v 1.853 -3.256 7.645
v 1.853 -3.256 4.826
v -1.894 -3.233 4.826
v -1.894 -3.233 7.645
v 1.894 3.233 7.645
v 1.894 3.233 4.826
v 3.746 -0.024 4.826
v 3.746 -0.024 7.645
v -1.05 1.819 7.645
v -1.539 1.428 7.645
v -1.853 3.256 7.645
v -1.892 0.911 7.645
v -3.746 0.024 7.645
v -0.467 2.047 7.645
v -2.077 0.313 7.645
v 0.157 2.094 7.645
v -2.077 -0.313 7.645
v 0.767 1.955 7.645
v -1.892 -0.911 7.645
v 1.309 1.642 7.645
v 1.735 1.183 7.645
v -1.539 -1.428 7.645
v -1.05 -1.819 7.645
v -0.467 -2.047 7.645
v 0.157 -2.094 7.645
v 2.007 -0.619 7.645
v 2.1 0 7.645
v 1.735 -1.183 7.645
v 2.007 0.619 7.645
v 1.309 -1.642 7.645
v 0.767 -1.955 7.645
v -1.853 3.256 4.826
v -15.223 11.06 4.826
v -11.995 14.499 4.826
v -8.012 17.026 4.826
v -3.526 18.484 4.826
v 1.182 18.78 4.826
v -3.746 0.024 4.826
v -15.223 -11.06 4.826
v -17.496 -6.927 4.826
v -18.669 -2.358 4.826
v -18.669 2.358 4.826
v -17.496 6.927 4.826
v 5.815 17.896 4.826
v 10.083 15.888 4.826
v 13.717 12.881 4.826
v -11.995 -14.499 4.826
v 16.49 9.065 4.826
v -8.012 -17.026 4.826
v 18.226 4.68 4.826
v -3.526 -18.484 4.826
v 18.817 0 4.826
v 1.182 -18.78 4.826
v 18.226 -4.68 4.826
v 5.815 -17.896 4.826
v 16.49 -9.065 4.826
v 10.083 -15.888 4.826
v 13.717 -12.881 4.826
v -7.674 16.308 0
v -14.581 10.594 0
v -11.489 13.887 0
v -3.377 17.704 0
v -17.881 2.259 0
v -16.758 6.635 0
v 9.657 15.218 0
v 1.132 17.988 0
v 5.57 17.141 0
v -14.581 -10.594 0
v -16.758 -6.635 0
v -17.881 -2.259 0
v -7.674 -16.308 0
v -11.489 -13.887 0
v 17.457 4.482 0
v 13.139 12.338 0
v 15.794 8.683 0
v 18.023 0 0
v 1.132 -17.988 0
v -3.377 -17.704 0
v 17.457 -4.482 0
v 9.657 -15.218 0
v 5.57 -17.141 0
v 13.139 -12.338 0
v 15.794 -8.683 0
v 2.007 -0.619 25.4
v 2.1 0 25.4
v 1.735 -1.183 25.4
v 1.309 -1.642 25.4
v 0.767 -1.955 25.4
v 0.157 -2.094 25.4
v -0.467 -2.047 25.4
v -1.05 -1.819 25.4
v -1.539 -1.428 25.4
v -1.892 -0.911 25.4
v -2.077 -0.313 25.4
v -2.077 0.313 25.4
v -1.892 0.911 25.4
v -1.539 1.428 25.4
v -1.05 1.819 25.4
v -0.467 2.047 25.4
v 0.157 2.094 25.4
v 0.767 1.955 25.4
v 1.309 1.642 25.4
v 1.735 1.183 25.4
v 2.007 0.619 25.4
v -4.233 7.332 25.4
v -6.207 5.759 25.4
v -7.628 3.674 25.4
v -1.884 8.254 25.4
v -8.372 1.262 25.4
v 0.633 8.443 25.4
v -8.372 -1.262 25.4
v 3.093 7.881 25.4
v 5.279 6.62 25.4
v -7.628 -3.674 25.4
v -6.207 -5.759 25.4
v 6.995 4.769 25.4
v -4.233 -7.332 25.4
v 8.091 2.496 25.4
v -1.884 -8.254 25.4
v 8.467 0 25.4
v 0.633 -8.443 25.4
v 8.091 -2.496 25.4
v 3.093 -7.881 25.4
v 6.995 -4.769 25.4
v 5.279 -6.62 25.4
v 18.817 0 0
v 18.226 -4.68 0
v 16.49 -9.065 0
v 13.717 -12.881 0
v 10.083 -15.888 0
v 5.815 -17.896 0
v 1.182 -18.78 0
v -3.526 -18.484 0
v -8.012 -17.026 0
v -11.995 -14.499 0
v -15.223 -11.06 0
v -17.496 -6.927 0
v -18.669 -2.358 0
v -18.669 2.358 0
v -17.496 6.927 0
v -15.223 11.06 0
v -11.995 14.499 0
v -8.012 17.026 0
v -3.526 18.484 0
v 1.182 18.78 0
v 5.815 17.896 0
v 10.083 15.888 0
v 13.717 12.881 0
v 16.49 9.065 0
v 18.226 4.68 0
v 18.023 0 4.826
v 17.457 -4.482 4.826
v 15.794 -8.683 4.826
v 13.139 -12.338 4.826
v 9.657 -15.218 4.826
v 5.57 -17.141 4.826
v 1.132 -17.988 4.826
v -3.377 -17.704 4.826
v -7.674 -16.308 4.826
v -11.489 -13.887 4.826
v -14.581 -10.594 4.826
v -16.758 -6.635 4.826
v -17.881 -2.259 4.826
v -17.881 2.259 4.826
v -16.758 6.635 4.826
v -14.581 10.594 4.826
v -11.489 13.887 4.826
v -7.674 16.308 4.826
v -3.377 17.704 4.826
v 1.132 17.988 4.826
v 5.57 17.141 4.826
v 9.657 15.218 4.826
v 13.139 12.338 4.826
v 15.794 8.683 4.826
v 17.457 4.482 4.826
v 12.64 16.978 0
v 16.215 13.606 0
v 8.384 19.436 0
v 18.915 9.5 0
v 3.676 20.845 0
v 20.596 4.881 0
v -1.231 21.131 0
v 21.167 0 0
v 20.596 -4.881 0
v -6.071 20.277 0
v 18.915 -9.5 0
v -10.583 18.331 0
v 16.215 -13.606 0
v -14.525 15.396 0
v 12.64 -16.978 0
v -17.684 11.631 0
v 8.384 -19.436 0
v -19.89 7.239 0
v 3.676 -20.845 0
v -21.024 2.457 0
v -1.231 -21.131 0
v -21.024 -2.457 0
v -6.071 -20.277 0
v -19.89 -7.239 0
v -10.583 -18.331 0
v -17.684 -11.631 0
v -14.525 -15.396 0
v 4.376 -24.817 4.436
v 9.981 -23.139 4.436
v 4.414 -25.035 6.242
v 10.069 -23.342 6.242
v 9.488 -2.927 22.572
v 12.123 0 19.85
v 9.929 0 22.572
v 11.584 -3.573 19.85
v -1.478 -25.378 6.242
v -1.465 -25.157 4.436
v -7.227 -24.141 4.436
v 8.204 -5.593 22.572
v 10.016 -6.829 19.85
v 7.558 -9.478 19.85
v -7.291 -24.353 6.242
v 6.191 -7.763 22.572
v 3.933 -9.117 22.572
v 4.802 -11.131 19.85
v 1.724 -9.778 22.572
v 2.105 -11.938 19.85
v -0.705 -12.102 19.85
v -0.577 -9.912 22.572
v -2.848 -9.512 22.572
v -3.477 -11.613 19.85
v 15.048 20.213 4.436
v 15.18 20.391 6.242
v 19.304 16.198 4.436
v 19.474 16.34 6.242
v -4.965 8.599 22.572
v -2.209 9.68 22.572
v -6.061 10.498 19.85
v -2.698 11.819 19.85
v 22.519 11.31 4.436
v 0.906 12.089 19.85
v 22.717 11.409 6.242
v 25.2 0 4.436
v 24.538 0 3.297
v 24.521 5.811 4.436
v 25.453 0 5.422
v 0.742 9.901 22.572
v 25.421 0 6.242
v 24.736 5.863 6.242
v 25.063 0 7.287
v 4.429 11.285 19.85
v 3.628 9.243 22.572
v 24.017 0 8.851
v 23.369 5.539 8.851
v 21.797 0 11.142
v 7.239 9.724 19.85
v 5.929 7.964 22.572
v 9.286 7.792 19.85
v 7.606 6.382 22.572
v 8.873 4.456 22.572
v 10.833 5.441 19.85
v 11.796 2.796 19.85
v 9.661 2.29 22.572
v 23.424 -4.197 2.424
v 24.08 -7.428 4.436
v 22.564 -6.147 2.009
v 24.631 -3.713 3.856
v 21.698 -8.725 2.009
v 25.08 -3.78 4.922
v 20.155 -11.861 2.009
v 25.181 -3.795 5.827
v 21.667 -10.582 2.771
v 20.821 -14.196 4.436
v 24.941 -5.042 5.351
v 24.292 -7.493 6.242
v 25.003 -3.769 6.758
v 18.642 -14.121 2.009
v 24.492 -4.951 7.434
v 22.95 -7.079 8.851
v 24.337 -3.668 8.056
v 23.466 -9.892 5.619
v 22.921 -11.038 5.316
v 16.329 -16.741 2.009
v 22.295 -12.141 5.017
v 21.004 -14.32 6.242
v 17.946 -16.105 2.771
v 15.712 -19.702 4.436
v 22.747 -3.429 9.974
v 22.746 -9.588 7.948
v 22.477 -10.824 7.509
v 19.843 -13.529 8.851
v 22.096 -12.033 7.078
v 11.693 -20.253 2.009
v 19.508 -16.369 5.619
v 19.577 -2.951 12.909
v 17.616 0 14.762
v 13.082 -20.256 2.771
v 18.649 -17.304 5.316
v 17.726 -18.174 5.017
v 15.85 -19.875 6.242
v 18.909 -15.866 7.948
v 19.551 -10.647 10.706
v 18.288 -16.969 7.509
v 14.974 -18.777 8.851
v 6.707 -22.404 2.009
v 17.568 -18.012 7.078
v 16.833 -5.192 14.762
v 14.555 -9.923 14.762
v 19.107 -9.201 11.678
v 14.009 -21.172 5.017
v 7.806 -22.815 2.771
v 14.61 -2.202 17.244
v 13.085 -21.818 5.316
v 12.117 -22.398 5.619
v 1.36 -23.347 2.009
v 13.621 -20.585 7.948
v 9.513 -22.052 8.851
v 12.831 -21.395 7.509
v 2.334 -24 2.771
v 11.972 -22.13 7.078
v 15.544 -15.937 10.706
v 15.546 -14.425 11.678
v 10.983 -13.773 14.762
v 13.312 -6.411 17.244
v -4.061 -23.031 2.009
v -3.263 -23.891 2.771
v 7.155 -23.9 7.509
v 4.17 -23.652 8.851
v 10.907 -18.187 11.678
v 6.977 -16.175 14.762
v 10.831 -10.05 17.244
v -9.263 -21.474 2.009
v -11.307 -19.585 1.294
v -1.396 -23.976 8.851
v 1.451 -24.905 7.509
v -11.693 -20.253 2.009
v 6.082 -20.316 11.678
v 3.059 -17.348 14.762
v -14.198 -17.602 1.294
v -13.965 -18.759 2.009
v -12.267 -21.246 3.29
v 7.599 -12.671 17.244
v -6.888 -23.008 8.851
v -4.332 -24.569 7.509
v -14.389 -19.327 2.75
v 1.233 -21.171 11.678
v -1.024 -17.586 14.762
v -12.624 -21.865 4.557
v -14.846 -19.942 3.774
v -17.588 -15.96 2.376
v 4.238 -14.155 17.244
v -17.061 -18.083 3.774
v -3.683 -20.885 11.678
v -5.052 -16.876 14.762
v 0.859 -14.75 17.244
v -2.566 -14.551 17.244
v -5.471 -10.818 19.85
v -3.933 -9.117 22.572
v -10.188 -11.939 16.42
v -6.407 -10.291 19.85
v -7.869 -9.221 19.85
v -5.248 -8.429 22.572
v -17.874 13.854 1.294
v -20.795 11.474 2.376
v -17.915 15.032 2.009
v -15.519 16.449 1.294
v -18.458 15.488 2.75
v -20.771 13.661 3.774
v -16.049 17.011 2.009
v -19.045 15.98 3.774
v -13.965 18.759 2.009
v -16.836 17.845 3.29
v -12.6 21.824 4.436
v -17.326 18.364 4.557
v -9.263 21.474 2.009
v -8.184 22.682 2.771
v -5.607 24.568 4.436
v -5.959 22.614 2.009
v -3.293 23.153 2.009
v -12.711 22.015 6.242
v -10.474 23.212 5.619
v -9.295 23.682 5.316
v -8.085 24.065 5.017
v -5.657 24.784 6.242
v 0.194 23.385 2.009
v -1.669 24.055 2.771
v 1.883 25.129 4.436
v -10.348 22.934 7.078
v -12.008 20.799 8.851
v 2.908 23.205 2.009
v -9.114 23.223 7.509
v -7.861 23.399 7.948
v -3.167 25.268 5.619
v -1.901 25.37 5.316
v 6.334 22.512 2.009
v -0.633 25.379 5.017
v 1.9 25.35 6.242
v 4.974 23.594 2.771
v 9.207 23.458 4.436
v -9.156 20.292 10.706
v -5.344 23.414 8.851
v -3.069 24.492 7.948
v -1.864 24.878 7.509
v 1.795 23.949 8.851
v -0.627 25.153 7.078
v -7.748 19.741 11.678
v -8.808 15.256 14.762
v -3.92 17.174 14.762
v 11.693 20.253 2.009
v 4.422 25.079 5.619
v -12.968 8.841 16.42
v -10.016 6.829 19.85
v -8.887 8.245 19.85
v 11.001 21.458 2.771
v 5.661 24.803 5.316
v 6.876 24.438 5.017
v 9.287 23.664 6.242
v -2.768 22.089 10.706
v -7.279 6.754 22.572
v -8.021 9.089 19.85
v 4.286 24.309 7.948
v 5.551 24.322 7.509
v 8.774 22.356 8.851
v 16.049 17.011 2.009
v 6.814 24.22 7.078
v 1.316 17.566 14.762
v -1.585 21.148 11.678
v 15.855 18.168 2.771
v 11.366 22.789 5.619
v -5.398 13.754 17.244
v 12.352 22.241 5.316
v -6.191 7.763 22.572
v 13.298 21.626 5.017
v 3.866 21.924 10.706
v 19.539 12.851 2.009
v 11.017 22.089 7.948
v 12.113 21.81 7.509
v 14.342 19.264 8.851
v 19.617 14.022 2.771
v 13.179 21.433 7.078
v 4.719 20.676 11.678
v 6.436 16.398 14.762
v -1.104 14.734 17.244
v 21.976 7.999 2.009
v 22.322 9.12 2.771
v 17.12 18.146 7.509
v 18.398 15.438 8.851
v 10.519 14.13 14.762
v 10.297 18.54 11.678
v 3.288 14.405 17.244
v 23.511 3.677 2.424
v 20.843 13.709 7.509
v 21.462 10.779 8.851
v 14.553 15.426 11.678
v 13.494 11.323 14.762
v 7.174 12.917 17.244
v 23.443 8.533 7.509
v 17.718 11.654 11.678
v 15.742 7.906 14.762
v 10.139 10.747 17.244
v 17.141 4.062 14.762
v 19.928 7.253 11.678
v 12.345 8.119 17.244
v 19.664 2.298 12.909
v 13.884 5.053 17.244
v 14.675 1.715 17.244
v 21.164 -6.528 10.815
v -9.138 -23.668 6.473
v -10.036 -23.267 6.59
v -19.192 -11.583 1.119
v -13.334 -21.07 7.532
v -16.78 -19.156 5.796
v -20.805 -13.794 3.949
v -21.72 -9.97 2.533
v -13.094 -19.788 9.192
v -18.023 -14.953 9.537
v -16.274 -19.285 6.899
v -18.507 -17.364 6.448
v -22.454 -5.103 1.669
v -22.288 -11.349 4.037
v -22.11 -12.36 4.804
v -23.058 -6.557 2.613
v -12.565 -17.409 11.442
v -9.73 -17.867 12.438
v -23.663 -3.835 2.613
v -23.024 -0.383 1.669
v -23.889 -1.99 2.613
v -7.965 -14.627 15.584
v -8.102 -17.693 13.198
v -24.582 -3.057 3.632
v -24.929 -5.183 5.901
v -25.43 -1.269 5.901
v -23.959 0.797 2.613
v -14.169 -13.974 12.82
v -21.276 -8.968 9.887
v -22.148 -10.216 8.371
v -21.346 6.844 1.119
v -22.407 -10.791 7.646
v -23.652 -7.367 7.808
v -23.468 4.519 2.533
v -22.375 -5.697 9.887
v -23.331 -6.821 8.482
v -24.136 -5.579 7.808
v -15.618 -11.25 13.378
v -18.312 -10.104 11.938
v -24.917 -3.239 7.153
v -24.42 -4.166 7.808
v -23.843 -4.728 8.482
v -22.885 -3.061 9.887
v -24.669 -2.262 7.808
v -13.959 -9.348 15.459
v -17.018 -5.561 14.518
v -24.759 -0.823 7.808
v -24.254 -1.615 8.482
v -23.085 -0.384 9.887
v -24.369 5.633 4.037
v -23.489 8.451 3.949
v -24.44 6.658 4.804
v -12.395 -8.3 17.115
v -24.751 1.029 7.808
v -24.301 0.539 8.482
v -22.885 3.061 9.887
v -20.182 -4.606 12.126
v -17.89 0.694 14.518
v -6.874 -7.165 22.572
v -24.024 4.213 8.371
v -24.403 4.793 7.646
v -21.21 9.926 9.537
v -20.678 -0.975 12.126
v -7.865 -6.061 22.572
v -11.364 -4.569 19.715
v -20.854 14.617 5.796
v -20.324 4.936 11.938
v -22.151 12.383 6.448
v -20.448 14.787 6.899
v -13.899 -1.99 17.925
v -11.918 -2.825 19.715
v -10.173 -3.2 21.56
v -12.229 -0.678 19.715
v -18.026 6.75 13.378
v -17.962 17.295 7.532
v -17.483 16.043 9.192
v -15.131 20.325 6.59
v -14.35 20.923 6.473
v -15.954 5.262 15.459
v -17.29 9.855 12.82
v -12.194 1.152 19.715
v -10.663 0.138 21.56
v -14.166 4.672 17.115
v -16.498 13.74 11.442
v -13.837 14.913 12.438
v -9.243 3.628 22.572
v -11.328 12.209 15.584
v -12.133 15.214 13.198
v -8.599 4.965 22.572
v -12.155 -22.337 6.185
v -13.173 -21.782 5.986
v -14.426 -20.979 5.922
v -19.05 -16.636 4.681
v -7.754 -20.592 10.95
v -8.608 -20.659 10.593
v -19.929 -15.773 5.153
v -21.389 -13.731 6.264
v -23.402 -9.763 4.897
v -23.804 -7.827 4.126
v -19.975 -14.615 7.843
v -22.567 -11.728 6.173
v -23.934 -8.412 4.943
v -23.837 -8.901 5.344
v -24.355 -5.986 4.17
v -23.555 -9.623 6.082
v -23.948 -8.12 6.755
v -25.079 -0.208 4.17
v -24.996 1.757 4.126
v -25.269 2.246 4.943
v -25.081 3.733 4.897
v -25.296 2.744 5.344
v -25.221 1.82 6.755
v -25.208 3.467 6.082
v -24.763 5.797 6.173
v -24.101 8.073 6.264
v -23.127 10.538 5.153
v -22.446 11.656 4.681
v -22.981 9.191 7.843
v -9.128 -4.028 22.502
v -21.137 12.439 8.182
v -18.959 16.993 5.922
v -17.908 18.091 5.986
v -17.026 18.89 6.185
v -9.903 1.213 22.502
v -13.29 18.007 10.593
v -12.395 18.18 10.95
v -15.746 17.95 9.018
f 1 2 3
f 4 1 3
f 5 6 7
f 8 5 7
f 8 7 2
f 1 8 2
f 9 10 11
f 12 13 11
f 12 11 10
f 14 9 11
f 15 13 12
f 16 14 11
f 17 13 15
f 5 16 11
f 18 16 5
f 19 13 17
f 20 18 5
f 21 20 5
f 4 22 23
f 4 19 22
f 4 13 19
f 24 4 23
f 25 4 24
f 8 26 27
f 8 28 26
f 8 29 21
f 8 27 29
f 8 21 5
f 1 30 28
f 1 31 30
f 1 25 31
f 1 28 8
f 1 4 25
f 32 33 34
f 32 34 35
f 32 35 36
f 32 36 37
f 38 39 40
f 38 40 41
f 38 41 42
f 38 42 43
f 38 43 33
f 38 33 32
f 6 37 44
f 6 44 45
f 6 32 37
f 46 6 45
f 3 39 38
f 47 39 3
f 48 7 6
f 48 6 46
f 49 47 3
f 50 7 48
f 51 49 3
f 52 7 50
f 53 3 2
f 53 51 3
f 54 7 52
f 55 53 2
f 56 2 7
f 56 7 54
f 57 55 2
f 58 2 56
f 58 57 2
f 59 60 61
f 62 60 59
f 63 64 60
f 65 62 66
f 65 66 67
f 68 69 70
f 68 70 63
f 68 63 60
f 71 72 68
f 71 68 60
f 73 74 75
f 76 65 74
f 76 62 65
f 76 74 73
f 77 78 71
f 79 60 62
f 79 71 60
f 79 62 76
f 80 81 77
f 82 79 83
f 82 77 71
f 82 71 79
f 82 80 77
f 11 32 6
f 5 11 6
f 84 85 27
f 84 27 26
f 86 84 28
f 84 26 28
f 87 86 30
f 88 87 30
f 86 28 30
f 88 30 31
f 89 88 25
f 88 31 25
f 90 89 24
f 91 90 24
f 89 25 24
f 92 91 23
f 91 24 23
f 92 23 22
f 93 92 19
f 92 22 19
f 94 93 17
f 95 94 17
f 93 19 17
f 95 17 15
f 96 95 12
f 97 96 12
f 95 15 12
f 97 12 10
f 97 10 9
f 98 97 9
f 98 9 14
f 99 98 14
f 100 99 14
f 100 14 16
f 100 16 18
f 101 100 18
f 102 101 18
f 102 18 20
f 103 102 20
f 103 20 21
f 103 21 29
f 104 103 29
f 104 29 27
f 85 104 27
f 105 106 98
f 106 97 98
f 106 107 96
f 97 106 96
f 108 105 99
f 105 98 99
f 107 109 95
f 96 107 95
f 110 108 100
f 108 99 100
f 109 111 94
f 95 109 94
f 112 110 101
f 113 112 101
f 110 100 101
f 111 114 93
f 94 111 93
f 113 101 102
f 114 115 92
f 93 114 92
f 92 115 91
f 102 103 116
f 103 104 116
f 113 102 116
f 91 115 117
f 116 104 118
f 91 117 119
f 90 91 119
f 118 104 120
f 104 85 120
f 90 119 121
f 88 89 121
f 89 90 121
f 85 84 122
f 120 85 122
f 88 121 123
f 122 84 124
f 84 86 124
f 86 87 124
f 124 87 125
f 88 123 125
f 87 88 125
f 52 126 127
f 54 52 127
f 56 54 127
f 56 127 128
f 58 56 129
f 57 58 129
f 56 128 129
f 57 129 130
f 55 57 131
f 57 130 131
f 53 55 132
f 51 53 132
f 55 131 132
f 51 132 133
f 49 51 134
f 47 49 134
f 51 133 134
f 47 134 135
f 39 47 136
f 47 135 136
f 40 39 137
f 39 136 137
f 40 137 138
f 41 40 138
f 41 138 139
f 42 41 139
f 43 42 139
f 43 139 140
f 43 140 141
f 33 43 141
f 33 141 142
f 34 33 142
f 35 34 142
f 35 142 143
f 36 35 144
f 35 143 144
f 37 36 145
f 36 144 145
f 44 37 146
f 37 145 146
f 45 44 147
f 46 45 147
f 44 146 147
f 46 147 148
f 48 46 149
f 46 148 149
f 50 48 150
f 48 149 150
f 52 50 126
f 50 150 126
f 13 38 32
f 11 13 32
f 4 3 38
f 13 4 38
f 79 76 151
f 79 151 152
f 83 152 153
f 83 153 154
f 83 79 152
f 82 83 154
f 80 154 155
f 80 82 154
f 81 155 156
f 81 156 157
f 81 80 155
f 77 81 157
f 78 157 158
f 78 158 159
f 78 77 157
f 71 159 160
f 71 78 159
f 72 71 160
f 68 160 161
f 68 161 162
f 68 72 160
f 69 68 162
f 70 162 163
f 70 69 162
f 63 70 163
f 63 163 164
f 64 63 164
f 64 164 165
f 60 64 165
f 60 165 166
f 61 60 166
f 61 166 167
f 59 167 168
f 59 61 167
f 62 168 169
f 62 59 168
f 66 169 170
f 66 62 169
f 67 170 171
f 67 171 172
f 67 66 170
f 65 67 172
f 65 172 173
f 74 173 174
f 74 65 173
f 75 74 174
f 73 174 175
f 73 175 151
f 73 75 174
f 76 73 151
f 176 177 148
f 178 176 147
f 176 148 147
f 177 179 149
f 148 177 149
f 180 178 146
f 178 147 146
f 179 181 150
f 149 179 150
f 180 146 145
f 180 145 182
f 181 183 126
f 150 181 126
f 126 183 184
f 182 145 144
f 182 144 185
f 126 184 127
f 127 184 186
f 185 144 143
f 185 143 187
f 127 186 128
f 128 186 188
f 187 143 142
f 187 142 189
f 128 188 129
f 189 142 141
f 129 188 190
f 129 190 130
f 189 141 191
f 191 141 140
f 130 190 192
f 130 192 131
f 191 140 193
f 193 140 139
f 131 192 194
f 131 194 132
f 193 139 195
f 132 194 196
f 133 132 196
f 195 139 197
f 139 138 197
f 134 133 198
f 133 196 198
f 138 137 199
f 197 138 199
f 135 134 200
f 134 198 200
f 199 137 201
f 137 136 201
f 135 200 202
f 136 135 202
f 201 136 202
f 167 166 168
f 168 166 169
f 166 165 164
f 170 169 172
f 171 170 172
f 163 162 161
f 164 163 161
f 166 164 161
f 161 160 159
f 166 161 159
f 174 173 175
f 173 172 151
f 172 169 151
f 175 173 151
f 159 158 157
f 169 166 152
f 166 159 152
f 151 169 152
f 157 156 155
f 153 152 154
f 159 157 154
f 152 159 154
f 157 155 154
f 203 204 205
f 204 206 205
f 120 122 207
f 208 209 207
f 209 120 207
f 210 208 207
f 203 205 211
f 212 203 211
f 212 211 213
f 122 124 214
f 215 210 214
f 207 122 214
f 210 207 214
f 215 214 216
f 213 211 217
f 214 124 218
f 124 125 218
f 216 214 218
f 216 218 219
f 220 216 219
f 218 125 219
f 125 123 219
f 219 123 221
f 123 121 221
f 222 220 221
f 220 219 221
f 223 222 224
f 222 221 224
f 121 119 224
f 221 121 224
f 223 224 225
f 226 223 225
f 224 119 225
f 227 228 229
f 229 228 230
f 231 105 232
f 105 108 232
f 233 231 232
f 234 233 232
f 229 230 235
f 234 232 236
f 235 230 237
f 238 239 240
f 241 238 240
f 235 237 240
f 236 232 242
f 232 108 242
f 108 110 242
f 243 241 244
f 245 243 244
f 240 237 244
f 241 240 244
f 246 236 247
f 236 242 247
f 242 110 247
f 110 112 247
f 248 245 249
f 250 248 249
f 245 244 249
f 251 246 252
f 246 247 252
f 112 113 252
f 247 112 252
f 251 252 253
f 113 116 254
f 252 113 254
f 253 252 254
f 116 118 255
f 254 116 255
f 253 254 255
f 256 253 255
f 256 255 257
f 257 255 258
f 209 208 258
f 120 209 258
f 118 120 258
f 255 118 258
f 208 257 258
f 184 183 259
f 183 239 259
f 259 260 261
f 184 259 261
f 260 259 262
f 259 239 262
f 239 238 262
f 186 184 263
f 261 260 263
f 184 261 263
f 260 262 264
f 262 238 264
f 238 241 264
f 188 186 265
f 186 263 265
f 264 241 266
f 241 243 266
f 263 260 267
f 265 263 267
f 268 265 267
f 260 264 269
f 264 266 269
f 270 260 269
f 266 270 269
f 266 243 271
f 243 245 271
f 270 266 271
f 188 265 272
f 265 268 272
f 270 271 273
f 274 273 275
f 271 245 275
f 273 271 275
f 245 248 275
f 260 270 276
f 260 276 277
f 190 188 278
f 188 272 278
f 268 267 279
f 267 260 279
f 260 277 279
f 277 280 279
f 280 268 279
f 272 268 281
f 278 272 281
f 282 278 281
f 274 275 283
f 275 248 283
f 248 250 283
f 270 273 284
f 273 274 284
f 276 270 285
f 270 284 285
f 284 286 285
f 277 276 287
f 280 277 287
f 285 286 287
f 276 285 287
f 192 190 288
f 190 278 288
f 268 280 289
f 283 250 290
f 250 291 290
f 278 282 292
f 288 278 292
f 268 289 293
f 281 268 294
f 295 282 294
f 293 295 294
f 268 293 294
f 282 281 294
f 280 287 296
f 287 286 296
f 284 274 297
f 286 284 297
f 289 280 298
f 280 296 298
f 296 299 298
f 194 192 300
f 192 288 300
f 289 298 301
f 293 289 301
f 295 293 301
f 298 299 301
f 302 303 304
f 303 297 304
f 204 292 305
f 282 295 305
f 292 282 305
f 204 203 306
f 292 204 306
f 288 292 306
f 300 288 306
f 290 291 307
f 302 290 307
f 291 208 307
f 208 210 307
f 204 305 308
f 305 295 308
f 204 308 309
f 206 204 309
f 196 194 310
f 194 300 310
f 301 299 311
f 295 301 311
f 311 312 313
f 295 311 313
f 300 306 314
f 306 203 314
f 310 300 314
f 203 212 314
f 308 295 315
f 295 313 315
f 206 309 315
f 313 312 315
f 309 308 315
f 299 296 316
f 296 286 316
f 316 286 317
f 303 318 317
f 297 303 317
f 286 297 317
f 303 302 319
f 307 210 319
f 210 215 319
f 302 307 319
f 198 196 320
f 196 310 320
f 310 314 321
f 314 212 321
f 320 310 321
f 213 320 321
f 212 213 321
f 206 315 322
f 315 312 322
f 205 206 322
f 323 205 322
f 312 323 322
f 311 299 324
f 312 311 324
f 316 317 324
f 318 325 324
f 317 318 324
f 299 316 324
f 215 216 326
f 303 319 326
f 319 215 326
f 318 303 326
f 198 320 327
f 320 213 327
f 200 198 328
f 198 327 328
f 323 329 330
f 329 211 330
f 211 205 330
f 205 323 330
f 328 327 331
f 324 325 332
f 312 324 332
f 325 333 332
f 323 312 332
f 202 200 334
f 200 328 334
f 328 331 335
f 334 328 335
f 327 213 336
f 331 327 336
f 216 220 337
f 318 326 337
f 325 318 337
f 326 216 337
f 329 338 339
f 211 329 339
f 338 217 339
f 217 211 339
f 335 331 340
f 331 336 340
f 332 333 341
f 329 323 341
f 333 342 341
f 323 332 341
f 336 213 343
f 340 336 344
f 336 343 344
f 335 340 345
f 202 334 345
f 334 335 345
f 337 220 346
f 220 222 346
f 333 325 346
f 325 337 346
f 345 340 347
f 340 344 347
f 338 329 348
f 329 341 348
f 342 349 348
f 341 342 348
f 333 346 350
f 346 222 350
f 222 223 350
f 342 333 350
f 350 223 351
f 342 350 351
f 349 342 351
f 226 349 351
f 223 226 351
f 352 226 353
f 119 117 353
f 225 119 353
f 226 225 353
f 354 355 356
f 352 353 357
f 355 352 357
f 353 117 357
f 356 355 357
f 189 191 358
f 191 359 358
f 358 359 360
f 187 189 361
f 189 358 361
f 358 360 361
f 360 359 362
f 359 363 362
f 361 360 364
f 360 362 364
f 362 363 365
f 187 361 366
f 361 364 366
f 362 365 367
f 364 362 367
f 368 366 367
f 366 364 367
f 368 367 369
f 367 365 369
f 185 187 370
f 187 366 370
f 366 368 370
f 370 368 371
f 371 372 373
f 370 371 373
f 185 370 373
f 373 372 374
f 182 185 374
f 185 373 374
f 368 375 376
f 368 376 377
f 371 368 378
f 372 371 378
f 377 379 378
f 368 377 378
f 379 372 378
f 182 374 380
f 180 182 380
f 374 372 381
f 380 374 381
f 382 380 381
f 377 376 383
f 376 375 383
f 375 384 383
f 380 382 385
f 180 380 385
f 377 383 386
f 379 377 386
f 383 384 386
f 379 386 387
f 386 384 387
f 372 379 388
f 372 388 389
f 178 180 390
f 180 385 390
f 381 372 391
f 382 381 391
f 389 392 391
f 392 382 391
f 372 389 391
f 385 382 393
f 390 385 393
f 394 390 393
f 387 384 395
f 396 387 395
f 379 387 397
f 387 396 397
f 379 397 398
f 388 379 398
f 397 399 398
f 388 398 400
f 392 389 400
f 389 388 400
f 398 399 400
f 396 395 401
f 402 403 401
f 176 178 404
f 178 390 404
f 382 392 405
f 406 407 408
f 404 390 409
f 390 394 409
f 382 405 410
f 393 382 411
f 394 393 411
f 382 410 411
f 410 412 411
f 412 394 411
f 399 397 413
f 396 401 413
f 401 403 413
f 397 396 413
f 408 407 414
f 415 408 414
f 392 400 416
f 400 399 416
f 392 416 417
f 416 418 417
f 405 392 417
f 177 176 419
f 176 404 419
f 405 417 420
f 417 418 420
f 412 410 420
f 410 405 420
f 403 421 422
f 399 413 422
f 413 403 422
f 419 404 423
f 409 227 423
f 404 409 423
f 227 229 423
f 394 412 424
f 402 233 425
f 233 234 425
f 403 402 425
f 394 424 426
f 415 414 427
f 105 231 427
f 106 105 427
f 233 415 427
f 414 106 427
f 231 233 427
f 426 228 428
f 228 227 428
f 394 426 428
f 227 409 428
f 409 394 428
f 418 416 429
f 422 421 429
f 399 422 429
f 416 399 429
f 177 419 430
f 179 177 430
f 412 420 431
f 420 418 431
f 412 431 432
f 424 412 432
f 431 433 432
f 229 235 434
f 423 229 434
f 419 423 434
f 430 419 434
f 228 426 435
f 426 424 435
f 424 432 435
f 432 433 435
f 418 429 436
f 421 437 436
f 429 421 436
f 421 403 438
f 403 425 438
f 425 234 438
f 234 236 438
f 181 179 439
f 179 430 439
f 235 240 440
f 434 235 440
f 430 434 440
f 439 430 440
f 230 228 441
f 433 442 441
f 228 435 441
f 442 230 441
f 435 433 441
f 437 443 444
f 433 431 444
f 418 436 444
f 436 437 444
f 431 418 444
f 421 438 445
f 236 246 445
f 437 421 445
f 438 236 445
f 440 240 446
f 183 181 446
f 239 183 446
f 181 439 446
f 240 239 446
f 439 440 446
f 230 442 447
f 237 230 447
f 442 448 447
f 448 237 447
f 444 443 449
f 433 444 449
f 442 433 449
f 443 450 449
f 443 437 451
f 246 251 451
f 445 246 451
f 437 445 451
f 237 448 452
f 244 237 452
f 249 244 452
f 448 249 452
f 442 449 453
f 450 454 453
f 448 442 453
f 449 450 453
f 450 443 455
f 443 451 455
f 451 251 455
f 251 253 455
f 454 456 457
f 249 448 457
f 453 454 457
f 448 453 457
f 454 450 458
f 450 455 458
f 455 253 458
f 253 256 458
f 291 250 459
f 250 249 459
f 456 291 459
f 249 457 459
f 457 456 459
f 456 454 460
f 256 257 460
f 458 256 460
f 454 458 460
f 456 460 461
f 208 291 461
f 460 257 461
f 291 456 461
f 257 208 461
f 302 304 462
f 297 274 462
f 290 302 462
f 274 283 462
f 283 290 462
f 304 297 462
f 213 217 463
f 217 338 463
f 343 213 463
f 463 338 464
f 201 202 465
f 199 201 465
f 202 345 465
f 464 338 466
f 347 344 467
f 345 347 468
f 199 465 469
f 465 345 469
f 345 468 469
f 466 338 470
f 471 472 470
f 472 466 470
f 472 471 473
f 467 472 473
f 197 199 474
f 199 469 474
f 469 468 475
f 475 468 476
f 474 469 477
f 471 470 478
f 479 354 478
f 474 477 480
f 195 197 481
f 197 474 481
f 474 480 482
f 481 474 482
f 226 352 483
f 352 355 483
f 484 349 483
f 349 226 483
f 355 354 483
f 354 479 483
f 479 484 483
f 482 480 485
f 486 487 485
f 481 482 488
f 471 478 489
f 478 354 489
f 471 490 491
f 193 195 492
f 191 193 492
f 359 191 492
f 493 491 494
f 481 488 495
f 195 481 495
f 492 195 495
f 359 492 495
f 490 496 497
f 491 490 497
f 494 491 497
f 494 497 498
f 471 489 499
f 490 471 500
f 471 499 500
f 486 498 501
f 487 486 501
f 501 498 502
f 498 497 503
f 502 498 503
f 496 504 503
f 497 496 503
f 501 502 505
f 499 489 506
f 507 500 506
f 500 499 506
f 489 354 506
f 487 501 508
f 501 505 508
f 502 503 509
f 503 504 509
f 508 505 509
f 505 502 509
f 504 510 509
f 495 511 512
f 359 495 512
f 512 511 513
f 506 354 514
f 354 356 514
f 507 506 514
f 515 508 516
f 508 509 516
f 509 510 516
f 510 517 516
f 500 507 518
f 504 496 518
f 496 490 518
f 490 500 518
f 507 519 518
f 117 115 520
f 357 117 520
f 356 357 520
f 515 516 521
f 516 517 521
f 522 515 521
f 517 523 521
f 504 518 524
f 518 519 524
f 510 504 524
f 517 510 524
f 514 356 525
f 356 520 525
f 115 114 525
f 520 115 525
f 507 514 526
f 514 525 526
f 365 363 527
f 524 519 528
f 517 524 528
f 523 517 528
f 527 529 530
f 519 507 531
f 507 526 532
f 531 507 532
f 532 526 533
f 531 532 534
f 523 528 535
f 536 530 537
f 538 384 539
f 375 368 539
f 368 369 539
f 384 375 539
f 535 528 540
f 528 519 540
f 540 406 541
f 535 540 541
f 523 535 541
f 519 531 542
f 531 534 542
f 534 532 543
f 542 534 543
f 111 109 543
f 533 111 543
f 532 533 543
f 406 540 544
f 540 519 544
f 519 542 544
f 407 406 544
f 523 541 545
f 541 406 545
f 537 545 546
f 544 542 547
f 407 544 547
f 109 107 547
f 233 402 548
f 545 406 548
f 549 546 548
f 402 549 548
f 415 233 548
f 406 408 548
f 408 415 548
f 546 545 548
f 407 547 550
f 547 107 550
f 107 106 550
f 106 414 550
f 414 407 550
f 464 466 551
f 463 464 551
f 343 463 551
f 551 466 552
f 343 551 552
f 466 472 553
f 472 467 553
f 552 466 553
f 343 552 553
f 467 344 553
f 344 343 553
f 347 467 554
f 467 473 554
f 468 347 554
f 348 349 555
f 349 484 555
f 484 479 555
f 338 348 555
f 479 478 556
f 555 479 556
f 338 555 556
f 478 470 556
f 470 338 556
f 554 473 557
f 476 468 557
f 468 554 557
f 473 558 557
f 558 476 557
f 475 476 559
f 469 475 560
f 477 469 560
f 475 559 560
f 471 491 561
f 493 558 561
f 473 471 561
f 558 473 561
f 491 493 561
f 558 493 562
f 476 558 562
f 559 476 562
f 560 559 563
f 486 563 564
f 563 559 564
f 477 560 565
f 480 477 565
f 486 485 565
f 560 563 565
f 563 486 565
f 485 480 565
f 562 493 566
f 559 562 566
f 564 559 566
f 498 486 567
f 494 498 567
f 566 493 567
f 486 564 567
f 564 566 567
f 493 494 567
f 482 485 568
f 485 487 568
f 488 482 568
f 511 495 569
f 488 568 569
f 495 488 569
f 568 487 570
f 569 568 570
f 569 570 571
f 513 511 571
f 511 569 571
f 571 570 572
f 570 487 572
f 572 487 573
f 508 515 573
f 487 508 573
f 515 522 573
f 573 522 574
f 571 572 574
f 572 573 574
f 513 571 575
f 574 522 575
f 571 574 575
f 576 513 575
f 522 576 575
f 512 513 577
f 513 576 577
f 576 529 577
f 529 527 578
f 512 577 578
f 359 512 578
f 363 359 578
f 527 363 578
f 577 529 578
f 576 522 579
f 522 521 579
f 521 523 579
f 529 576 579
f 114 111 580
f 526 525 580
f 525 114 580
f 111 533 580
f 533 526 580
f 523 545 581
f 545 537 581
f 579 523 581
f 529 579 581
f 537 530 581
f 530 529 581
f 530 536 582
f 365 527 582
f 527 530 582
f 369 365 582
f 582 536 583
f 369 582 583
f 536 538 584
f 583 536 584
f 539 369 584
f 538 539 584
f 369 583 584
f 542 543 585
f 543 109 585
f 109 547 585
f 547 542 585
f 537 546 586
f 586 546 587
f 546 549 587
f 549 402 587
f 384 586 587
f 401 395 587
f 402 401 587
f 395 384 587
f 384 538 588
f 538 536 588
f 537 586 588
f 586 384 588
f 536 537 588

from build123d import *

# Parameters (mm, degrees)
F2_R     = 18.8171666667
F3_DEPTH = 4.826
F5_DEPTH = 7.6454
F6_R     = 2.0999958
F7_DEPTH = 17.7556001
F8_R     = 18.0234166667
F9_DEPTH = 4.826


with BuildPart() as f1:
    # F0 (on Front) → F1 (revolve)
    with BuildSketch(Plane.XZ):
        with BuildLine():
            Line((0, 25.4), (0, 0))
            Line((0, 0), (21.1666666667, 0))
            add(Edge.make_bspline(
                [(21.1666666667, 0), (22.8693635663, 1.6177524075), (31.6154373363, 7.5493314952), (11.1343017502, 17.7709202107), (8.466666582, 25.4)],
                knots=[0, 0, 0, 0, 0.3536699627, 1, 1, 1, 1], degree=3))
            Line((8.466666582, 25.4), (0, 25.4))
        make_face()
    revolve(axis=Axis((0, 0, 12.7), (0, 0, -1)))

    # F2 (on face) → F3 (cut)
    with BuildSketch(Plane(origin=(0, 0, 0), x_dir=(1, 0, 0), z_dir=(0, 0, -1))):
        Circle(F2_R)
    extrude(amount=-F3_DEPTH, mode=Mode.SUBTRACT)

    # F4 (on face) → F5 (cut)
    with BuildSketch(Plane(origin=(0, 0, 0), x_dir=(1, 0, 0), z_dir=(0, 0, -1))):
        Polygon((3.746424326, 0.0238121685), (1.8525902201, 3.256404724), (-1.8938341059, 3.2325925554), (-3.746424326, -0.0238121685), (-1.8525902201, -3.256404724), (1.8938341059, -3.2325925554), align=None)
    extrude(amount=-F5_DEPTH, mode=Mode.SUBTRACT)

    # F6 (on face) → F7 (cut, through all)
    with BuildSketch(Plane(origin=(0, 0, 7.6454), x_dir=(1, 0, 0), z_dir=(0, 0, -1))):
        Circle(F6_R)
    extrude(amount=-F7_DEPTH, mode=Mode.SUBTRACT)


with BuildPart() as f9:
    # F8 (on face) → F9 (new body, through all)
    with BuildSketch(Plane(origin=(0, 0, 0), x_dir=(1, 0, 0), z_dir=(0, 0, -1))):
        Circle(F8_R)
    extrude(amount=-F9_DEPTH)


solid = Compound([f1.part, f9.part])
